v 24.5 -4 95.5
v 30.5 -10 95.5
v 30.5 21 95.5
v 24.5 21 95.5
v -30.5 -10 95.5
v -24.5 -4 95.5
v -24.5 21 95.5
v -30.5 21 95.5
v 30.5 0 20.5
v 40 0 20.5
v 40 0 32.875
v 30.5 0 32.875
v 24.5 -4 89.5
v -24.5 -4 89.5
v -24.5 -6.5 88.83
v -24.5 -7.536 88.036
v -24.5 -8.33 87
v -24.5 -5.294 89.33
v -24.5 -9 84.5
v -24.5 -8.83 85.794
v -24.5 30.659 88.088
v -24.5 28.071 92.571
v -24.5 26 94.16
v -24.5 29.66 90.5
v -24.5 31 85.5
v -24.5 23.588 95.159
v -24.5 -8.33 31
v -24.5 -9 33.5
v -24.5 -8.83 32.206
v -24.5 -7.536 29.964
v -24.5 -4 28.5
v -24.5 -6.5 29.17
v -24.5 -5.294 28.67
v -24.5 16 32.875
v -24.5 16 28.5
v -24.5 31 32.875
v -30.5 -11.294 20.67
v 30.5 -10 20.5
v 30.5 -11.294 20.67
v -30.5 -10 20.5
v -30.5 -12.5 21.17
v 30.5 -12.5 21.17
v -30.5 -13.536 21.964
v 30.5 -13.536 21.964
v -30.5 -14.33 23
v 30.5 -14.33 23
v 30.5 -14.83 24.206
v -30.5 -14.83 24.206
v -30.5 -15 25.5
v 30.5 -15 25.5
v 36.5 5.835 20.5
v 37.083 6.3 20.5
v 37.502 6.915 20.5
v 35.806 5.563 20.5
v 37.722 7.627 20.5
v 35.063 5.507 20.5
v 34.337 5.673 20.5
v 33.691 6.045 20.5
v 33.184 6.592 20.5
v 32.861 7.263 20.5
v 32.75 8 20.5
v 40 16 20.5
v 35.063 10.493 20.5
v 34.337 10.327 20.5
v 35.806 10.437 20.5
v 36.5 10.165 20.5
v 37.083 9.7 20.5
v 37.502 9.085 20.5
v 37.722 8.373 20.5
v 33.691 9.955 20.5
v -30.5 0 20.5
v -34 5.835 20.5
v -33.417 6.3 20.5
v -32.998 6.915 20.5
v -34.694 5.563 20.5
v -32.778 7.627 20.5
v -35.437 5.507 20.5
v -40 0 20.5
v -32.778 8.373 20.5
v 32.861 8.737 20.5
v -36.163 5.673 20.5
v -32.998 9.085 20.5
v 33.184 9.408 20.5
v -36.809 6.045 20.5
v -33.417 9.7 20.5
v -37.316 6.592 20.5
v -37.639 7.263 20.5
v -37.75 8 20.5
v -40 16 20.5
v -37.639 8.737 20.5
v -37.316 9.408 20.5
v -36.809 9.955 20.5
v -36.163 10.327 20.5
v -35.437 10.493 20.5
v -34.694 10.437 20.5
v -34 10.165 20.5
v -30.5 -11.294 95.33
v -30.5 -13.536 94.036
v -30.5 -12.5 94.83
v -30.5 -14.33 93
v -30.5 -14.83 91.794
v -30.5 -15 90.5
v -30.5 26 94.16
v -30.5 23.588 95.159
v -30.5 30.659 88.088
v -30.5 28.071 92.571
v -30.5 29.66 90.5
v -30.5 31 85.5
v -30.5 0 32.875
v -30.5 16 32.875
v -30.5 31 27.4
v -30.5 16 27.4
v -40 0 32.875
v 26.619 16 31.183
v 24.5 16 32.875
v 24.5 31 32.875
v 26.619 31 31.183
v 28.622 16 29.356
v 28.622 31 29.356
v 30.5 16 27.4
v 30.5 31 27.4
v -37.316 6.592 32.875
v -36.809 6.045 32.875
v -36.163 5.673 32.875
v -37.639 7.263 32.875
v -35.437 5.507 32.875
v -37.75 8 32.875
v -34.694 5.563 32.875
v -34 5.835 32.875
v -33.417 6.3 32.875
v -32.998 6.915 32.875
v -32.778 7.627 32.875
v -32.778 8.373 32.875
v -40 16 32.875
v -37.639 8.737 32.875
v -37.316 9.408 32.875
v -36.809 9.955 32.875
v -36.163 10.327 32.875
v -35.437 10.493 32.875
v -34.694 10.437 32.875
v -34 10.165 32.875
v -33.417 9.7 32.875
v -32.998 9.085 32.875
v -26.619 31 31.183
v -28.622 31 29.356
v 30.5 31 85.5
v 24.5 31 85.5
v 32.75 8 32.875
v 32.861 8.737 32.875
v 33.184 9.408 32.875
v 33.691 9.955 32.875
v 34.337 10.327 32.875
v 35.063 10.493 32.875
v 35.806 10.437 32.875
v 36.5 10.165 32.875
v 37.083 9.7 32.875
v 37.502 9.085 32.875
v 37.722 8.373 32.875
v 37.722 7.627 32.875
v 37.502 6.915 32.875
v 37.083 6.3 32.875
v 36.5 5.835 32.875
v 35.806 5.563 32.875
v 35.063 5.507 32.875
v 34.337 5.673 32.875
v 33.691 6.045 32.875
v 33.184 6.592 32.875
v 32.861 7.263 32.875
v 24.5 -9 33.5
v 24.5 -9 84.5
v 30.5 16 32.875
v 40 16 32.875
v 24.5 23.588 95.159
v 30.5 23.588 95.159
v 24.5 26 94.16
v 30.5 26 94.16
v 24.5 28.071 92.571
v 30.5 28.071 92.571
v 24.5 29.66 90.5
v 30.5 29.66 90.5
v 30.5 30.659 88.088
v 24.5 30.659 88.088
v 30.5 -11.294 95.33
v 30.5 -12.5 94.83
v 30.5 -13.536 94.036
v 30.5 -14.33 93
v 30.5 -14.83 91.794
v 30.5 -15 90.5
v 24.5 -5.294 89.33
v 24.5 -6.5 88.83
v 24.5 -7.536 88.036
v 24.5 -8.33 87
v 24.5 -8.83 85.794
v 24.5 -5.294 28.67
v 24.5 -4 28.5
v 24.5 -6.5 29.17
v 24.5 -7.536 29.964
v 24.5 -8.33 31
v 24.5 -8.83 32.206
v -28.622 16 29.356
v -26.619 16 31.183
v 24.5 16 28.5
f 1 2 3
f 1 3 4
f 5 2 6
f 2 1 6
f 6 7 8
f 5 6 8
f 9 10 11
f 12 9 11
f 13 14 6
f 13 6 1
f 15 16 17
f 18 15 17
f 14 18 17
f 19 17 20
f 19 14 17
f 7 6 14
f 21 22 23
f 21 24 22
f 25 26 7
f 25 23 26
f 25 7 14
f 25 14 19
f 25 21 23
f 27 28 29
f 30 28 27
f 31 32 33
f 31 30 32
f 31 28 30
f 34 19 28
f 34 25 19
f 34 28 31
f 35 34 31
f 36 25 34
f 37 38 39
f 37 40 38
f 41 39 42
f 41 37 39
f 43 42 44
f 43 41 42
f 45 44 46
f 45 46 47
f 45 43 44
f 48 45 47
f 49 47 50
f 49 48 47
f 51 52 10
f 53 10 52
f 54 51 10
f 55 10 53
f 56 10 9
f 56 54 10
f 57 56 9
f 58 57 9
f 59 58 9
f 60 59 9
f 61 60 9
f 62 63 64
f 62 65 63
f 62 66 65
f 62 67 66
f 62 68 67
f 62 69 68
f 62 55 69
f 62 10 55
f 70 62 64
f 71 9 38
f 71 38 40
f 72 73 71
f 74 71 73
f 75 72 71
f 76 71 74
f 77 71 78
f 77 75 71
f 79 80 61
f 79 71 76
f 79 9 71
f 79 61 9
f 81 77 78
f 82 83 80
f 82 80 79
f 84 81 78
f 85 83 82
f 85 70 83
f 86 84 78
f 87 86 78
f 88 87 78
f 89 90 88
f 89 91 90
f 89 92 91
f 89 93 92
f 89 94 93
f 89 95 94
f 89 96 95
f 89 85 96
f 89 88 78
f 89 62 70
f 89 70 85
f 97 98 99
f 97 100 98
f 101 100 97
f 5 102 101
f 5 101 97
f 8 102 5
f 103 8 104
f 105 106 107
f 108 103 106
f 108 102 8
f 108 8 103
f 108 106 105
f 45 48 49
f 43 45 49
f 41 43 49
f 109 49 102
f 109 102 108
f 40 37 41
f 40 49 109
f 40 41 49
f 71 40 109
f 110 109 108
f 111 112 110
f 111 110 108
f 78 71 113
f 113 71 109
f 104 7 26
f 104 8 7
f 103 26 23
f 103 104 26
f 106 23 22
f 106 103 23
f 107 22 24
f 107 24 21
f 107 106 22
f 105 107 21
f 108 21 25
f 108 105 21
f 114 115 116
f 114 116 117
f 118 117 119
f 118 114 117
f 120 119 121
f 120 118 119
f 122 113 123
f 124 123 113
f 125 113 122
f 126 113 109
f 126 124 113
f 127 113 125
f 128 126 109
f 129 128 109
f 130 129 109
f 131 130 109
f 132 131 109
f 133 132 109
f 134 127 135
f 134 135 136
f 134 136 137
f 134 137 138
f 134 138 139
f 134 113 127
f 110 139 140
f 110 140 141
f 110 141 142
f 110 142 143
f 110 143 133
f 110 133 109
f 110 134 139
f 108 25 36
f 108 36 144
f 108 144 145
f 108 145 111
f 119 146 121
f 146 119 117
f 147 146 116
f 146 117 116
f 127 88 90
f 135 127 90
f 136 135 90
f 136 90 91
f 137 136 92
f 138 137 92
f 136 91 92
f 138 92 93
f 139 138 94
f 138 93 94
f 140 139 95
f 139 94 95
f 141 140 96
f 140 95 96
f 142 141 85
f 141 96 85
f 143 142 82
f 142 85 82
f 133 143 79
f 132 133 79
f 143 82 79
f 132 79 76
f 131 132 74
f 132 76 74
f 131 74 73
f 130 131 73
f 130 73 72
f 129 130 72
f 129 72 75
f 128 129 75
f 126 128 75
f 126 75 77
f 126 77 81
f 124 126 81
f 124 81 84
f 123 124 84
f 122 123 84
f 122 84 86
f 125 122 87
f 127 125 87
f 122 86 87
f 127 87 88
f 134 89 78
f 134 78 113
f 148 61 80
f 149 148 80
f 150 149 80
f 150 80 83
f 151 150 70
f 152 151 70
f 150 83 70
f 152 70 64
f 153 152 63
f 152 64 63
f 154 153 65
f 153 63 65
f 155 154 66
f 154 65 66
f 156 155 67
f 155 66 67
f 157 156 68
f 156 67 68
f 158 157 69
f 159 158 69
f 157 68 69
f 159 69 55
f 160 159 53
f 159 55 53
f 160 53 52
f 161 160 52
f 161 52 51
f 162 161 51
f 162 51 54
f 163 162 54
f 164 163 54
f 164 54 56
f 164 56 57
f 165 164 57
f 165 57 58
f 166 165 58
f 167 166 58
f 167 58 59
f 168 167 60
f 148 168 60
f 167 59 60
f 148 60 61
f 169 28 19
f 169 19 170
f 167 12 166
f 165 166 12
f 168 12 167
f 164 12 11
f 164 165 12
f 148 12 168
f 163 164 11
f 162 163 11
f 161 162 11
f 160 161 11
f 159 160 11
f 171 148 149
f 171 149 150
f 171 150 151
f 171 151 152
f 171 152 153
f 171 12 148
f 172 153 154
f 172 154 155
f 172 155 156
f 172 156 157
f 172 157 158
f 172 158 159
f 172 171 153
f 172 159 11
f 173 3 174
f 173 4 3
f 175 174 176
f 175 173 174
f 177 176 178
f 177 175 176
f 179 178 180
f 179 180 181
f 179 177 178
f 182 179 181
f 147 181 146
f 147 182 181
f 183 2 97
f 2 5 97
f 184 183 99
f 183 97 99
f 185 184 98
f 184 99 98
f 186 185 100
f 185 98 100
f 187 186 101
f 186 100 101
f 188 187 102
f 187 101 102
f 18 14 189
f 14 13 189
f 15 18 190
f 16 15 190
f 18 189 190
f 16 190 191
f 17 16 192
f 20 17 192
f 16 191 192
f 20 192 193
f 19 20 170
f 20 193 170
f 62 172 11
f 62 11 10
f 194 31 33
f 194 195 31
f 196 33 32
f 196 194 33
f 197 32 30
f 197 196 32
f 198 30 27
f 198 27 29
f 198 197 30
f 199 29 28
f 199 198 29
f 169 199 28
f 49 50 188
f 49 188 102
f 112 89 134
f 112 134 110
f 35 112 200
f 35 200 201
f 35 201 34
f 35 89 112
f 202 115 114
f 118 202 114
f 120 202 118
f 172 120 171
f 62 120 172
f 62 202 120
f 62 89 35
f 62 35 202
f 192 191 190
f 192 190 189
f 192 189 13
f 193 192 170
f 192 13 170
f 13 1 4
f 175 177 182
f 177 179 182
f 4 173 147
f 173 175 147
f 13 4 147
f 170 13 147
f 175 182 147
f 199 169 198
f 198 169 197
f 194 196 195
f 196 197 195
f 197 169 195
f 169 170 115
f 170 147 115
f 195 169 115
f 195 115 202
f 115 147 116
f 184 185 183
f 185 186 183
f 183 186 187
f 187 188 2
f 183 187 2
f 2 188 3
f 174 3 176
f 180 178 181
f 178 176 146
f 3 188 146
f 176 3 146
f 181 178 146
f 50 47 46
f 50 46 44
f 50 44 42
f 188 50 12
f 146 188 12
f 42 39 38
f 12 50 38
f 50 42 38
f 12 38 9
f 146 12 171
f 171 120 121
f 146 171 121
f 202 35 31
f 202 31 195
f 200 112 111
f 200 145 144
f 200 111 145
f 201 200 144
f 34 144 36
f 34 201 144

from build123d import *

# Parameters (mm, degrees)
SKETCH1_R                 = 40
BOSS_EXTRUDE1_DEPTH       = 16
SKETCH2_W                 = 41
SKETCH2_H                 = 41
CUT_EXTRUDE1_DEPTH        = 59.787753827
SKETCH13_W                = 61
SKETCH13_H                = 46
BOSS_EXTRUDE4_DEPTH       = 75
SKETCH14_W                = 49
SKETCH14_H                = 67
CUT_EXTRUDE2_DEPTH        = 35
SKETCH15_W                = 49
SKETCH15_H                = 61
CUT_EXTRUDE3_DEPTH        = 5
FILLET1_R                 = 10
FILLET2_R                 = 5
CUT_EXTRUDE5_REACH        = 110.08
SKETCH17_R                = 41
BOSS_EXTRUDE5_DEPTH       = 16
CUT_EXTRUDE4_DEPTH        = 118.224144271
CUT_EXTRUDE4_DEPTH_BACK   = 118.224144271
SKETCH16_R                = 3
F_5_0MM_DOWEL_HOLE1_D     = 5
F_5_0MM_DOWEL_HOLE1_DEPTH = 25
F_5_0MM_DOWEL_HOLE1_TIP   = 1.502151548
CUT_EXTRUDE7_DEPTH        = 123.446927311
CUT_EXTRUDE7_DEPTH_BACK   = 123.446927311
SKETCH22_W                = 41
SKETCH22_H                = 41


with BuildPart() as part:
    # Sketch1 → Boss-Extrude1 (new body)
    with BuildSketch(Plane(origin=(0, 0, 0), x_dir=(1, 0, 0), z_dir=(0, 1, 0))):
        with Locations(Location((0, 0, 0), (0, 0, 270))):
            Circle(SKETCH1_R)
    extrude(amount=BOSS_EXTRUDE1_DEPTH)

    # Sketch2 → Cut-Extrude1 (cut, through all)
    with BuildSketch(Plane(origin=(0, 16, 0), x_dir=(1, 0, 0), z_dir=(0, 1, 0))):
        Rectangle(SKETCH2_W, SKETCH2_H)
    extrude(amount=-CUT_EXTRUDE1_DEPTH, mode=Mode.SUBTRACT)

    # Sketch13 → Boss-Extrude4 (add)
    with BuildSketch(Plane(origin=(0, 0, 20.5), x_dir=(-1, 0, 0), z_dir=(0, 0, -1))):
        with Locations((0, 8)):
            Rectangle(SKETCH13_W, SKETCH13_H)
    extrude(amount=-BOSS_EXTRUDE4_DEPTH)

    # Sketch14 → Cut-Extrude2 (cut)
    with BuildSketch(Plane(origin=(0, 31, 0), x_dir=(1, 0, 0), z_dir=(0, 1, 0))):
        with Locations((0, -62)):
            Rectangle(SKETCH14_W, SKETCH14_H)
    extrude(amount=-CUT_EXTRUDE2_DEPTH, mode=Mode.SUBTRACT)

    # Sketch15 → Cut-Extrude3 (cut)
    with BuildSketch(Plane(origin=(0, -4, 0), x_dir=(1, 0, 0), z_dir=(0, 1, 0))):
        with Locations((0, -59)):
            Rectangle(SKETCH15_W, SKETCH15_H)
    extrude(amount=-CUT_EXTRUDE3_DEPTH, mode=Mode.SUBTRACT)

    # Fillet1
    fillet1_edges = [part.edges().sort_by_distance(p)[0] for p in [
        (-27.5, 31, 95.5),
        (27.5, 31, 95.5),
    ]]
    fillet(fillet1_edges, radius=FILLET1_R)

    # Fillet2
    fillet2_edges = [part.edges().sort_by_distance(p)[0] for p in [
        (0, -9, 89.5),
        (0, -15, 95.5),
        (0, -15, 20.5),
        (0, -9, 28.5),
    ]]
    fillet(fillet2_edges, radius=FILLET2_R - 0.0001)  # a hair under: the kernel refuses the full size

    # Sketch17 → Cut-Extrude5 (cut, up to next)
    with BuildSketch(Plane(origin=(0, 16, 0), x_dir=(1, 0, 0), z_dir=(0, 1, 0)), mode=Mode.PRIVATE) as cut_extrude5_sk1:
        Circle(SKETCH17_R)
    cut_extrude5_tool1 = extrude(cut_extrude5_sk1.sketch, amount=CUT_EXTRUDE5_REACH, mode=Mode.PRIVATE) & part.part
    add(cut_extrude5_tool1.solids().sort_by_distance((0, 16, 0))[0], mode=Mode.SUBTRACT)

    # Sketch18 → Boss-Extrude5 (add)
    with BuildSketch(Plane(origin=(0, 16, 0), x_dir=(1, 0, 0), z_dir=(0, 1, 0))):
        Polygon((20.5, 0), (20.5, -20.5), (-20.5, -20.5), (-20.5, 0), (-40, 0), (-40, -32.874762357), (-24.5, -32.874762357), (-24.5, -28.5), (24.5, -28.5), (24.5, -32.874762357), (40, -32.874762357), (40, 0), align=None)
    extrude(amount=-BOSS_EXTRUDE5_DEPTH)

    # Sketch16 → Cut-Extrude4 (cut, two sides: drawn at the far end of the back side and taken through both)
    with BuildSketch(Plane.ZY.offset(-20.5).offset(-CUT_EXTRUDE4_DEPTH_BACK)):
        with Locations(Location((0, 8, 0), (0, 0, 270))):
            Circle(SKETCH16_R)
    extrude(amount=CUT_EXTRUDE4_DEPTH + CUT_EXTRUDE4_DEPTH_BACK, mode=Mode.SUBTRACT)

    # Ø5.0mm Dowel Hole1
    with Locations(Plane(origin=(-35.25, 8, 32.874762357), x_dir=(1, 0, 0), z_dir=(0, 0, 1))):
        with Locations((0, 0), (70.5, 0)):
            Hole(F_5_0MM_DOWEL_HOLE1_D / 2, depth=F_5_0MM_DOWEL_HOLE1_DEPTH)
            with Locations((0, 0, -(F_5_0MM_DOWEL_HOLE1_DEPTH + F_5_0MM_DOWEL_HOLE1_TIP / 2))):  # 118° drill point
                Cone(0, F_5_0MM_DOWEL_HOLE1_D / 2, F_5_0MM_DOWEL_HOLE1_TIP, mode=Mode.SUBTRACT)

    # Sketch22 → Cut-Extrude7 (cut, two sides: drawn at the far end of the back side and taken through both)
    with BuildSketch(Plane(origin=(0, 16, -16), x_dir=(1, 0, 0), z_dir=(0, -1, 0)).offset(-CUT_EXTRUDE7_DEPTH_BACK)):
        with Locations((0, 16)):
            Rectangle(SKETCH22_W, SKETCH22_H)
        with BuildLine():
            Line((40, 16), (40, 36.5))
            Line((40, 36.5), (20.5, 36.5))
            Line((20.5, 36.5), (20.5, -4.5))
            Line((20.5, -4.5), (-20.5, -4.5))
            Line((-20.5, -4.5), (-20.5, 36.5))
            Line((-20.5, 36.5), (-40, 36.5))
            Line((-40, 36.5), (-40, 16))
            ThreePointArc((-40, 16), (-28.284271226, -12.284271269), (6.1e-08, -24))
            ThreePointArc((6.1e-08, -24), (28.284271269, -12.284271226), (40, 16))
        make_face()
        with BuildLine():
            Line((40, -24), (40, 16))
            ThreePointArc((40, 16), (28.284271269, -12.284271226), (6.1e-08, -24))
            Line((6.1e-08, -24), (40, -24))
        make_face()
        with BuildLine():
            Line((-40, -24), (6.1e-08, -24))
            ThreePointArc((6.1e-08, -24), (-28.284271226, -12.284271269), (-40, 16))
            Line((-40, 16), (-40, -24))
        make_face()
    extrude(amount=CUT_EXTRUDE7_DEPTH + CUT_EXTRUDE7_DEPTH_BACK, mode=Mode.SUBTRACT)


solid = part.part
